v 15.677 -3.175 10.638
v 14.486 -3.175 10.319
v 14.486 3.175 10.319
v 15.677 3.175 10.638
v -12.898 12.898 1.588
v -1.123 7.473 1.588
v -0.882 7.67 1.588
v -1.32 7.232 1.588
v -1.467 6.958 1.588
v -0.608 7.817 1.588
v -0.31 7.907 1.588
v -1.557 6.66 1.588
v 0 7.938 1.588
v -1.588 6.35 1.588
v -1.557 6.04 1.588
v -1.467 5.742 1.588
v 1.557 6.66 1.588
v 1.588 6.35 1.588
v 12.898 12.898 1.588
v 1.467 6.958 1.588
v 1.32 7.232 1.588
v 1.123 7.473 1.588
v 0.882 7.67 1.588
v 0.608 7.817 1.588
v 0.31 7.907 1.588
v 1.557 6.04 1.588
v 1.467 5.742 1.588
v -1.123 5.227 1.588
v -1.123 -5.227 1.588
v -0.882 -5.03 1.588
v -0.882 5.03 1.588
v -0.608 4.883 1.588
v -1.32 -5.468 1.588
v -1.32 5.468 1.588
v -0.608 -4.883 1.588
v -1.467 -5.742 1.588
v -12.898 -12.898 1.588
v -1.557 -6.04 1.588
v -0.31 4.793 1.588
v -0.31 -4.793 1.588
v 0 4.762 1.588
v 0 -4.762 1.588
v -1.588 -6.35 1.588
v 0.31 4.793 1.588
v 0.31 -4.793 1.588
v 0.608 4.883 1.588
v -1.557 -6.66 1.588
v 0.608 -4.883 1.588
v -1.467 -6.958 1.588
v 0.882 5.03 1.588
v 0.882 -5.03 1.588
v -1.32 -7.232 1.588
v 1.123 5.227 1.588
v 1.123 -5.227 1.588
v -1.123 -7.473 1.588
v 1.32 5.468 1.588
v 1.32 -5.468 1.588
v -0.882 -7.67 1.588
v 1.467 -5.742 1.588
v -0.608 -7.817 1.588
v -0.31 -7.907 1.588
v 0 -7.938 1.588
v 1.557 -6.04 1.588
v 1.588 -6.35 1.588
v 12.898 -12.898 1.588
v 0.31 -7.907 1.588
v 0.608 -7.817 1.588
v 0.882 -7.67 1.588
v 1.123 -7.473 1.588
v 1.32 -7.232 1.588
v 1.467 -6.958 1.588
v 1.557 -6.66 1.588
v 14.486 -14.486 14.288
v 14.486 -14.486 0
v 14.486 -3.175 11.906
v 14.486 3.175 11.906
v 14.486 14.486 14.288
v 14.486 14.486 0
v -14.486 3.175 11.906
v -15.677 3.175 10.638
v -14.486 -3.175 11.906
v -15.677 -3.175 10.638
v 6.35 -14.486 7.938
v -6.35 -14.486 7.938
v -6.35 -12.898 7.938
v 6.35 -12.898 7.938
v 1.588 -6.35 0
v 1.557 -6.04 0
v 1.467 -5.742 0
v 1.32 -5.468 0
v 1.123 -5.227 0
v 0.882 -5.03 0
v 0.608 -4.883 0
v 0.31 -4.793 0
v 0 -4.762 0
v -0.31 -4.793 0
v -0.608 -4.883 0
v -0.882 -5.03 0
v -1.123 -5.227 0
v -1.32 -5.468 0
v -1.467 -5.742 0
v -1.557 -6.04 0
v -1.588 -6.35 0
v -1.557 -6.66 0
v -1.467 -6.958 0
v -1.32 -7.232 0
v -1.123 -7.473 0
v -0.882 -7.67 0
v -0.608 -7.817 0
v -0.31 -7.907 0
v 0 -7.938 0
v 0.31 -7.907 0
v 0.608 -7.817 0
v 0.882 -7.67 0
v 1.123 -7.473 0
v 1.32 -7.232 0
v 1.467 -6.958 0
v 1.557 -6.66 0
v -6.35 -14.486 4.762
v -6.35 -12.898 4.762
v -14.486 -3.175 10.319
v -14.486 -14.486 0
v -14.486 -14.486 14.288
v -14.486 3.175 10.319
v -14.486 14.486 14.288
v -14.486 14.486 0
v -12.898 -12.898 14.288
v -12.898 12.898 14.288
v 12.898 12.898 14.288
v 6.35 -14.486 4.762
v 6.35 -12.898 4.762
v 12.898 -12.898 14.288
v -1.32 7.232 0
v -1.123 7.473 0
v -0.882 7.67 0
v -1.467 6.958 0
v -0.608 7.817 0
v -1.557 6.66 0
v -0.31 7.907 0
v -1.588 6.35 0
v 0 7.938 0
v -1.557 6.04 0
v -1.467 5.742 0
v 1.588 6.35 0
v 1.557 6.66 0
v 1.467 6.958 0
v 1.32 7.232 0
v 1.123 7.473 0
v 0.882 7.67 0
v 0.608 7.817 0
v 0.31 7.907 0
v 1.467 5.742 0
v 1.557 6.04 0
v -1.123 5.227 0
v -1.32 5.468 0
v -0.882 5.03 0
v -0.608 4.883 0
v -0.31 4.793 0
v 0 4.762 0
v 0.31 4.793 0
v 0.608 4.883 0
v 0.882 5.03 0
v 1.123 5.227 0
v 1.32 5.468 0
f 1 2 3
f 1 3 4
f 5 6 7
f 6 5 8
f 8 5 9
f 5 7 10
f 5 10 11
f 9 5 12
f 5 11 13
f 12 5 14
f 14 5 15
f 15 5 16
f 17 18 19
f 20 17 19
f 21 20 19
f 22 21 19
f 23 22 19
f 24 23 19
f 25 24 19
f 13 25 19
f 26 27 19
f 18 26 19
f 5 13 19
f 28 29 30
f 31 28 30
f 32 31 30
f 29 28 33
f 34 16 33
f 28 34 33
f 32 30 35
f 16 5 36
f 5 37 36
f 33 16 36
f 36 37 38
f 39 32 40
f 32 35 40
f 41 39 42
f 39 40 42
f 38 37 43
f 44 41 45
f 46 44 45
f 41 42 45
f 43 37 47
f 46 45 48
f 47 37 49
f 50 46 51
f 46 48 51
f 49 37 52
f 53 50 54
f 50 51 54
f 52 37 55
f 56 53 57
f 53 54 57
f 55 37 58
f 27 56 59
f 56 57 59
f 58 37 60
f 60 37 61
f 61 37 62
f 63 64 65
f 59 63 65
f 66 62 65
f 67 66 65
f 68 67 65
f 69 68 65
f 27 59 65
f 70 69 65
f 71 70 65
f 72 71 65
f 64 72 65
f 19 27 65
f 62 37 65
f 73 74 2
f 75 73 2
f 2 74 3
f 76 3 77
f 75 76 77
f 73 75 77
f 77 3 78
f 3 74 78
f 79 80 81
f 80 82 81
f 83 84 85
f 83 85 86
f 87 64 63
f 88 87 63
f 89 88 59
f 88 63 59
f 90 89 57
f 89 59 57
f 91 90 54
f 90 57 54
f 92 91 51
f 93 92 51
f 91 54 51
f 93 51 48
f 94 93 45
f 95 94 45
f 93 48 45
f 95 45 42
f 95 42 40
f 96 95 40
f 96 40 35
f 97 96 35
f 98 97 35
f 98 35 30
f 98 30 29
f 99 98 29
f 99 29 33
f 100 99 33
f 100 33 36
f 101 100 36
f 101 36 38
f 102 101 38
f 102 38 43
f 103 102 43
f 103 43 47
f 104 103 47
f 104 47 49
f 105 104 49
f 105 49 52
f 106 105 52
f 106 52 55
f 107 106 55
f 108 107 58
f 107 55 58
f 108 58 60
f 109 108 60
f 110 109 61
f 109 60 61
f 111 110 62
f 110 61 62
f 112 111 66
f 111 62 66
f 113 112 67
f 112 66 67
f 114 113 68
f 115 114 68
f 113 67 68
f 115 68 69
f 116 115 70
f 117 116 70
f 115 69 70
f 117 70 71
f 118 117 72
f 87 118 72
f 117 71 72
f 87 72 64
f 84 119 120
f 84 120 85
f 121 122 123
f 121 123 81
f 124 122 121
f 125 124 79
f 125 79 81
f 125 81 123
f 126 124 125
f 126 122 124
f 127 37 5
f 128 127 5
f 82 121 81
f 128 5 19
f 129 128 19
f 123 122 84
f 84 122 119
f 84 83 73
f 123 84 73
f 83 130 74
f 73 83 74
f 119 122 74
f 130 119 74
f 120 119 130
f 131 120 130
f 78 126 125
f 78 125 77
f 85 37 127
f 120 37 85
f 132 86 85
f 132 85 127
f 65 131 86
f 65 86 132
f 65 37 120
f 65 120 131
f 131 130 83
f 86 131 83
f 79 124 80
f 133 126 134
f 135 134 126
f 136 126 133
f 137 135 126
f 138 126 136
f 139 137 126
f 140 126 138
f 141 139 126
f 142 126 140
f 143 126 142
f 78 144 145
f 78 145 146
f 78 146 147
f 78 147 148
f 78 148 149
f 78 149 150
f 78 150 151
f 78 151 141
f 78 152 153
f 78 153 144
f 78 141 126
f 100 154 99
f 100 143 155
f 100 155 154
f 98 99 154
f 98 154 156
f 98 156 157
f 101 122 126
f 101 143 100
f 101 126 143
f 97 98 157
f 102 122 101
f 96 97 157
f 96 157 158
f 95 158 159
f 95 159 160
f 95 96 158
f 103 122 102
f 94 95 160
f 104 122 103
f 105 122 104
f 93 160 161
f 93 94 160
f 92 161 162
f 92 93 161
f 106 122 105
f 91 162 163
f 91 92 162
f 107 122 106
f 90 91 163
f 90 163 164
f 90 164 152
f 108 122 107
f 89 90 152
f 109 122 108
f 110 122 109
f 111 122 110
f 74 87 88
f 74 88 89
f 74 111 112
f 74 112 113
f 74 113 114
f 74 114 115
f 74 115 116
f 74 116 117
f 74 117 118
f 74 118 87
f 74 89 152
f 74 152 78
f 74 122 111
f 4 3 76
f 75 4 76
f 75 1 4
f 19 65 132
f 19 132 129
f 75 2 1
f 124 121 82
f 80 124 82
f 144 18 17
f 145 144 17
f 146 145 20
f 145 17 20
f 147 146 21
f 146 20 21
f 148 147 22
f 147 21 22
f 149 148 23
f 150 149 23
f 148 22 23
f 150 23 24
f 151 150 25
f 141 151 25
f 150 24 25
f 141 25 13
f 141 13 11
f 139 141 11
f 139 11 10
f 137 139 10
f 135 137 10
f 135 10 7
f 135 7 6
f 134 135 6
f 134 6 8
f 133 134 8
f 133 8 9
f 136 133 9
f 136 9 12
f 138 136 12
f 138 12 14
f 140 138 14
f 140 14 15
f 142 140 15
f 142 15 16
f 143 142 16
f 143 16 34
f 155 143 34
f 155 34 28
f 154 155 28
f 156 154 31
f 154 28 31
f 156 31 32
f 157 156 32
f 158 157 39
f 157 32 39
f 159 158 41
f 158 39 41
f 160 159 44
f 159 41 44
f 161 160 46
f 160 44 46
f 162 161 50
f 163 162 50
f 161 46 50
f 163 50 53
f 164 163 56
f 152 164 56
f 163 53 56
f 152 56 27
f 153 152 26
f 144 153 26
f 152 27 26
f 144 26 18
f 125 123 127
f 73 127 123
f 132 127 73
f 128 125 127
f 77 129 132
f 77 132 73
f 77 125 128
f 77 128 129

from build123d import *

# Parameters (mm, degrees)
F0_W      = 28.971875
F0_H      = 28.971875
F0_W_2    = 25.796875
F0_H_2    = 25.796875
F1_DEPTH  = 14.2875
F2_W      = 25.796875
F2_H      = 25.796875
F3_DEPTH  = 1.5875
F6_DEPTH  = 3.175
F8_R      = 1.5875
F9_DEPTH  = 1.5885
F10_W     = 12.7
F10_H     = 3.175
F11_DEPTH = 1.5875


# Not quite as in the source:
# - a pattern or mirror of a feature is missing from the dataset's text; its kind, count and spacing are read off the source's solid


with BuildPart() as f1:
    # F0 (on Top) → F1 (new body)
    with BuildSketch(Plane.XY):
        Rectangle(F0_W, F0_H)
        Rectangle(F0_W_2, F0_H_2, mode=Mode.SUBTRACT)
    extrude(amount=F1_DEPTH)

    # F2 (on face) → F3 (join)
    with BuildSketch(Plane(origin=(0, 0, 0), x_dir=(1, 0, 0), z_dir=(0, 0, -1))):
        Rectangle(F2_W, F2_H)
    extrude(amount=-F3_DEPTH)

    # F4: union 

    # F5 (on Front) → F6 (join, symmetric)
    with BuildSketch(Plane.XZ):
        Polygon((14.4859375, 11.90625), (14.4859375, 10.31875), (15.6765625, 10.6377770072), align=None)
    f6 = extrude(amount=F6_DEPTH, both=True)

    # F6_copies: F6 across plane
    add(f6.mirror(Plane(origin=(0, 0, 0), x_dir=(0, 0, -1), z_dir=(-1, 0, 0))))

    # F8 (on face) → F9 (cut, through all)
    with BuildSketch(Plane.XY.offset(1.5875)):
        with Locations((0, 6.35)):
            Circle(F8_R)
        with Locations((0, -6.35)):
            Circle(F8_R)
    extrude(amount=-F9_DEPTH, mode=Mode.SUBTRACT)

    # F10 (on face) → F11 (cut, through all)
    with BuildSketch(Plane.XZ.offset(14.4859375)):
        with Locations((0, 6.35)):
            Rectangle(F10_W, F10_H)
    extrude(amount=-F11_DEPTH, mode=Mode.SUBTRACT)


solid = f1.part
